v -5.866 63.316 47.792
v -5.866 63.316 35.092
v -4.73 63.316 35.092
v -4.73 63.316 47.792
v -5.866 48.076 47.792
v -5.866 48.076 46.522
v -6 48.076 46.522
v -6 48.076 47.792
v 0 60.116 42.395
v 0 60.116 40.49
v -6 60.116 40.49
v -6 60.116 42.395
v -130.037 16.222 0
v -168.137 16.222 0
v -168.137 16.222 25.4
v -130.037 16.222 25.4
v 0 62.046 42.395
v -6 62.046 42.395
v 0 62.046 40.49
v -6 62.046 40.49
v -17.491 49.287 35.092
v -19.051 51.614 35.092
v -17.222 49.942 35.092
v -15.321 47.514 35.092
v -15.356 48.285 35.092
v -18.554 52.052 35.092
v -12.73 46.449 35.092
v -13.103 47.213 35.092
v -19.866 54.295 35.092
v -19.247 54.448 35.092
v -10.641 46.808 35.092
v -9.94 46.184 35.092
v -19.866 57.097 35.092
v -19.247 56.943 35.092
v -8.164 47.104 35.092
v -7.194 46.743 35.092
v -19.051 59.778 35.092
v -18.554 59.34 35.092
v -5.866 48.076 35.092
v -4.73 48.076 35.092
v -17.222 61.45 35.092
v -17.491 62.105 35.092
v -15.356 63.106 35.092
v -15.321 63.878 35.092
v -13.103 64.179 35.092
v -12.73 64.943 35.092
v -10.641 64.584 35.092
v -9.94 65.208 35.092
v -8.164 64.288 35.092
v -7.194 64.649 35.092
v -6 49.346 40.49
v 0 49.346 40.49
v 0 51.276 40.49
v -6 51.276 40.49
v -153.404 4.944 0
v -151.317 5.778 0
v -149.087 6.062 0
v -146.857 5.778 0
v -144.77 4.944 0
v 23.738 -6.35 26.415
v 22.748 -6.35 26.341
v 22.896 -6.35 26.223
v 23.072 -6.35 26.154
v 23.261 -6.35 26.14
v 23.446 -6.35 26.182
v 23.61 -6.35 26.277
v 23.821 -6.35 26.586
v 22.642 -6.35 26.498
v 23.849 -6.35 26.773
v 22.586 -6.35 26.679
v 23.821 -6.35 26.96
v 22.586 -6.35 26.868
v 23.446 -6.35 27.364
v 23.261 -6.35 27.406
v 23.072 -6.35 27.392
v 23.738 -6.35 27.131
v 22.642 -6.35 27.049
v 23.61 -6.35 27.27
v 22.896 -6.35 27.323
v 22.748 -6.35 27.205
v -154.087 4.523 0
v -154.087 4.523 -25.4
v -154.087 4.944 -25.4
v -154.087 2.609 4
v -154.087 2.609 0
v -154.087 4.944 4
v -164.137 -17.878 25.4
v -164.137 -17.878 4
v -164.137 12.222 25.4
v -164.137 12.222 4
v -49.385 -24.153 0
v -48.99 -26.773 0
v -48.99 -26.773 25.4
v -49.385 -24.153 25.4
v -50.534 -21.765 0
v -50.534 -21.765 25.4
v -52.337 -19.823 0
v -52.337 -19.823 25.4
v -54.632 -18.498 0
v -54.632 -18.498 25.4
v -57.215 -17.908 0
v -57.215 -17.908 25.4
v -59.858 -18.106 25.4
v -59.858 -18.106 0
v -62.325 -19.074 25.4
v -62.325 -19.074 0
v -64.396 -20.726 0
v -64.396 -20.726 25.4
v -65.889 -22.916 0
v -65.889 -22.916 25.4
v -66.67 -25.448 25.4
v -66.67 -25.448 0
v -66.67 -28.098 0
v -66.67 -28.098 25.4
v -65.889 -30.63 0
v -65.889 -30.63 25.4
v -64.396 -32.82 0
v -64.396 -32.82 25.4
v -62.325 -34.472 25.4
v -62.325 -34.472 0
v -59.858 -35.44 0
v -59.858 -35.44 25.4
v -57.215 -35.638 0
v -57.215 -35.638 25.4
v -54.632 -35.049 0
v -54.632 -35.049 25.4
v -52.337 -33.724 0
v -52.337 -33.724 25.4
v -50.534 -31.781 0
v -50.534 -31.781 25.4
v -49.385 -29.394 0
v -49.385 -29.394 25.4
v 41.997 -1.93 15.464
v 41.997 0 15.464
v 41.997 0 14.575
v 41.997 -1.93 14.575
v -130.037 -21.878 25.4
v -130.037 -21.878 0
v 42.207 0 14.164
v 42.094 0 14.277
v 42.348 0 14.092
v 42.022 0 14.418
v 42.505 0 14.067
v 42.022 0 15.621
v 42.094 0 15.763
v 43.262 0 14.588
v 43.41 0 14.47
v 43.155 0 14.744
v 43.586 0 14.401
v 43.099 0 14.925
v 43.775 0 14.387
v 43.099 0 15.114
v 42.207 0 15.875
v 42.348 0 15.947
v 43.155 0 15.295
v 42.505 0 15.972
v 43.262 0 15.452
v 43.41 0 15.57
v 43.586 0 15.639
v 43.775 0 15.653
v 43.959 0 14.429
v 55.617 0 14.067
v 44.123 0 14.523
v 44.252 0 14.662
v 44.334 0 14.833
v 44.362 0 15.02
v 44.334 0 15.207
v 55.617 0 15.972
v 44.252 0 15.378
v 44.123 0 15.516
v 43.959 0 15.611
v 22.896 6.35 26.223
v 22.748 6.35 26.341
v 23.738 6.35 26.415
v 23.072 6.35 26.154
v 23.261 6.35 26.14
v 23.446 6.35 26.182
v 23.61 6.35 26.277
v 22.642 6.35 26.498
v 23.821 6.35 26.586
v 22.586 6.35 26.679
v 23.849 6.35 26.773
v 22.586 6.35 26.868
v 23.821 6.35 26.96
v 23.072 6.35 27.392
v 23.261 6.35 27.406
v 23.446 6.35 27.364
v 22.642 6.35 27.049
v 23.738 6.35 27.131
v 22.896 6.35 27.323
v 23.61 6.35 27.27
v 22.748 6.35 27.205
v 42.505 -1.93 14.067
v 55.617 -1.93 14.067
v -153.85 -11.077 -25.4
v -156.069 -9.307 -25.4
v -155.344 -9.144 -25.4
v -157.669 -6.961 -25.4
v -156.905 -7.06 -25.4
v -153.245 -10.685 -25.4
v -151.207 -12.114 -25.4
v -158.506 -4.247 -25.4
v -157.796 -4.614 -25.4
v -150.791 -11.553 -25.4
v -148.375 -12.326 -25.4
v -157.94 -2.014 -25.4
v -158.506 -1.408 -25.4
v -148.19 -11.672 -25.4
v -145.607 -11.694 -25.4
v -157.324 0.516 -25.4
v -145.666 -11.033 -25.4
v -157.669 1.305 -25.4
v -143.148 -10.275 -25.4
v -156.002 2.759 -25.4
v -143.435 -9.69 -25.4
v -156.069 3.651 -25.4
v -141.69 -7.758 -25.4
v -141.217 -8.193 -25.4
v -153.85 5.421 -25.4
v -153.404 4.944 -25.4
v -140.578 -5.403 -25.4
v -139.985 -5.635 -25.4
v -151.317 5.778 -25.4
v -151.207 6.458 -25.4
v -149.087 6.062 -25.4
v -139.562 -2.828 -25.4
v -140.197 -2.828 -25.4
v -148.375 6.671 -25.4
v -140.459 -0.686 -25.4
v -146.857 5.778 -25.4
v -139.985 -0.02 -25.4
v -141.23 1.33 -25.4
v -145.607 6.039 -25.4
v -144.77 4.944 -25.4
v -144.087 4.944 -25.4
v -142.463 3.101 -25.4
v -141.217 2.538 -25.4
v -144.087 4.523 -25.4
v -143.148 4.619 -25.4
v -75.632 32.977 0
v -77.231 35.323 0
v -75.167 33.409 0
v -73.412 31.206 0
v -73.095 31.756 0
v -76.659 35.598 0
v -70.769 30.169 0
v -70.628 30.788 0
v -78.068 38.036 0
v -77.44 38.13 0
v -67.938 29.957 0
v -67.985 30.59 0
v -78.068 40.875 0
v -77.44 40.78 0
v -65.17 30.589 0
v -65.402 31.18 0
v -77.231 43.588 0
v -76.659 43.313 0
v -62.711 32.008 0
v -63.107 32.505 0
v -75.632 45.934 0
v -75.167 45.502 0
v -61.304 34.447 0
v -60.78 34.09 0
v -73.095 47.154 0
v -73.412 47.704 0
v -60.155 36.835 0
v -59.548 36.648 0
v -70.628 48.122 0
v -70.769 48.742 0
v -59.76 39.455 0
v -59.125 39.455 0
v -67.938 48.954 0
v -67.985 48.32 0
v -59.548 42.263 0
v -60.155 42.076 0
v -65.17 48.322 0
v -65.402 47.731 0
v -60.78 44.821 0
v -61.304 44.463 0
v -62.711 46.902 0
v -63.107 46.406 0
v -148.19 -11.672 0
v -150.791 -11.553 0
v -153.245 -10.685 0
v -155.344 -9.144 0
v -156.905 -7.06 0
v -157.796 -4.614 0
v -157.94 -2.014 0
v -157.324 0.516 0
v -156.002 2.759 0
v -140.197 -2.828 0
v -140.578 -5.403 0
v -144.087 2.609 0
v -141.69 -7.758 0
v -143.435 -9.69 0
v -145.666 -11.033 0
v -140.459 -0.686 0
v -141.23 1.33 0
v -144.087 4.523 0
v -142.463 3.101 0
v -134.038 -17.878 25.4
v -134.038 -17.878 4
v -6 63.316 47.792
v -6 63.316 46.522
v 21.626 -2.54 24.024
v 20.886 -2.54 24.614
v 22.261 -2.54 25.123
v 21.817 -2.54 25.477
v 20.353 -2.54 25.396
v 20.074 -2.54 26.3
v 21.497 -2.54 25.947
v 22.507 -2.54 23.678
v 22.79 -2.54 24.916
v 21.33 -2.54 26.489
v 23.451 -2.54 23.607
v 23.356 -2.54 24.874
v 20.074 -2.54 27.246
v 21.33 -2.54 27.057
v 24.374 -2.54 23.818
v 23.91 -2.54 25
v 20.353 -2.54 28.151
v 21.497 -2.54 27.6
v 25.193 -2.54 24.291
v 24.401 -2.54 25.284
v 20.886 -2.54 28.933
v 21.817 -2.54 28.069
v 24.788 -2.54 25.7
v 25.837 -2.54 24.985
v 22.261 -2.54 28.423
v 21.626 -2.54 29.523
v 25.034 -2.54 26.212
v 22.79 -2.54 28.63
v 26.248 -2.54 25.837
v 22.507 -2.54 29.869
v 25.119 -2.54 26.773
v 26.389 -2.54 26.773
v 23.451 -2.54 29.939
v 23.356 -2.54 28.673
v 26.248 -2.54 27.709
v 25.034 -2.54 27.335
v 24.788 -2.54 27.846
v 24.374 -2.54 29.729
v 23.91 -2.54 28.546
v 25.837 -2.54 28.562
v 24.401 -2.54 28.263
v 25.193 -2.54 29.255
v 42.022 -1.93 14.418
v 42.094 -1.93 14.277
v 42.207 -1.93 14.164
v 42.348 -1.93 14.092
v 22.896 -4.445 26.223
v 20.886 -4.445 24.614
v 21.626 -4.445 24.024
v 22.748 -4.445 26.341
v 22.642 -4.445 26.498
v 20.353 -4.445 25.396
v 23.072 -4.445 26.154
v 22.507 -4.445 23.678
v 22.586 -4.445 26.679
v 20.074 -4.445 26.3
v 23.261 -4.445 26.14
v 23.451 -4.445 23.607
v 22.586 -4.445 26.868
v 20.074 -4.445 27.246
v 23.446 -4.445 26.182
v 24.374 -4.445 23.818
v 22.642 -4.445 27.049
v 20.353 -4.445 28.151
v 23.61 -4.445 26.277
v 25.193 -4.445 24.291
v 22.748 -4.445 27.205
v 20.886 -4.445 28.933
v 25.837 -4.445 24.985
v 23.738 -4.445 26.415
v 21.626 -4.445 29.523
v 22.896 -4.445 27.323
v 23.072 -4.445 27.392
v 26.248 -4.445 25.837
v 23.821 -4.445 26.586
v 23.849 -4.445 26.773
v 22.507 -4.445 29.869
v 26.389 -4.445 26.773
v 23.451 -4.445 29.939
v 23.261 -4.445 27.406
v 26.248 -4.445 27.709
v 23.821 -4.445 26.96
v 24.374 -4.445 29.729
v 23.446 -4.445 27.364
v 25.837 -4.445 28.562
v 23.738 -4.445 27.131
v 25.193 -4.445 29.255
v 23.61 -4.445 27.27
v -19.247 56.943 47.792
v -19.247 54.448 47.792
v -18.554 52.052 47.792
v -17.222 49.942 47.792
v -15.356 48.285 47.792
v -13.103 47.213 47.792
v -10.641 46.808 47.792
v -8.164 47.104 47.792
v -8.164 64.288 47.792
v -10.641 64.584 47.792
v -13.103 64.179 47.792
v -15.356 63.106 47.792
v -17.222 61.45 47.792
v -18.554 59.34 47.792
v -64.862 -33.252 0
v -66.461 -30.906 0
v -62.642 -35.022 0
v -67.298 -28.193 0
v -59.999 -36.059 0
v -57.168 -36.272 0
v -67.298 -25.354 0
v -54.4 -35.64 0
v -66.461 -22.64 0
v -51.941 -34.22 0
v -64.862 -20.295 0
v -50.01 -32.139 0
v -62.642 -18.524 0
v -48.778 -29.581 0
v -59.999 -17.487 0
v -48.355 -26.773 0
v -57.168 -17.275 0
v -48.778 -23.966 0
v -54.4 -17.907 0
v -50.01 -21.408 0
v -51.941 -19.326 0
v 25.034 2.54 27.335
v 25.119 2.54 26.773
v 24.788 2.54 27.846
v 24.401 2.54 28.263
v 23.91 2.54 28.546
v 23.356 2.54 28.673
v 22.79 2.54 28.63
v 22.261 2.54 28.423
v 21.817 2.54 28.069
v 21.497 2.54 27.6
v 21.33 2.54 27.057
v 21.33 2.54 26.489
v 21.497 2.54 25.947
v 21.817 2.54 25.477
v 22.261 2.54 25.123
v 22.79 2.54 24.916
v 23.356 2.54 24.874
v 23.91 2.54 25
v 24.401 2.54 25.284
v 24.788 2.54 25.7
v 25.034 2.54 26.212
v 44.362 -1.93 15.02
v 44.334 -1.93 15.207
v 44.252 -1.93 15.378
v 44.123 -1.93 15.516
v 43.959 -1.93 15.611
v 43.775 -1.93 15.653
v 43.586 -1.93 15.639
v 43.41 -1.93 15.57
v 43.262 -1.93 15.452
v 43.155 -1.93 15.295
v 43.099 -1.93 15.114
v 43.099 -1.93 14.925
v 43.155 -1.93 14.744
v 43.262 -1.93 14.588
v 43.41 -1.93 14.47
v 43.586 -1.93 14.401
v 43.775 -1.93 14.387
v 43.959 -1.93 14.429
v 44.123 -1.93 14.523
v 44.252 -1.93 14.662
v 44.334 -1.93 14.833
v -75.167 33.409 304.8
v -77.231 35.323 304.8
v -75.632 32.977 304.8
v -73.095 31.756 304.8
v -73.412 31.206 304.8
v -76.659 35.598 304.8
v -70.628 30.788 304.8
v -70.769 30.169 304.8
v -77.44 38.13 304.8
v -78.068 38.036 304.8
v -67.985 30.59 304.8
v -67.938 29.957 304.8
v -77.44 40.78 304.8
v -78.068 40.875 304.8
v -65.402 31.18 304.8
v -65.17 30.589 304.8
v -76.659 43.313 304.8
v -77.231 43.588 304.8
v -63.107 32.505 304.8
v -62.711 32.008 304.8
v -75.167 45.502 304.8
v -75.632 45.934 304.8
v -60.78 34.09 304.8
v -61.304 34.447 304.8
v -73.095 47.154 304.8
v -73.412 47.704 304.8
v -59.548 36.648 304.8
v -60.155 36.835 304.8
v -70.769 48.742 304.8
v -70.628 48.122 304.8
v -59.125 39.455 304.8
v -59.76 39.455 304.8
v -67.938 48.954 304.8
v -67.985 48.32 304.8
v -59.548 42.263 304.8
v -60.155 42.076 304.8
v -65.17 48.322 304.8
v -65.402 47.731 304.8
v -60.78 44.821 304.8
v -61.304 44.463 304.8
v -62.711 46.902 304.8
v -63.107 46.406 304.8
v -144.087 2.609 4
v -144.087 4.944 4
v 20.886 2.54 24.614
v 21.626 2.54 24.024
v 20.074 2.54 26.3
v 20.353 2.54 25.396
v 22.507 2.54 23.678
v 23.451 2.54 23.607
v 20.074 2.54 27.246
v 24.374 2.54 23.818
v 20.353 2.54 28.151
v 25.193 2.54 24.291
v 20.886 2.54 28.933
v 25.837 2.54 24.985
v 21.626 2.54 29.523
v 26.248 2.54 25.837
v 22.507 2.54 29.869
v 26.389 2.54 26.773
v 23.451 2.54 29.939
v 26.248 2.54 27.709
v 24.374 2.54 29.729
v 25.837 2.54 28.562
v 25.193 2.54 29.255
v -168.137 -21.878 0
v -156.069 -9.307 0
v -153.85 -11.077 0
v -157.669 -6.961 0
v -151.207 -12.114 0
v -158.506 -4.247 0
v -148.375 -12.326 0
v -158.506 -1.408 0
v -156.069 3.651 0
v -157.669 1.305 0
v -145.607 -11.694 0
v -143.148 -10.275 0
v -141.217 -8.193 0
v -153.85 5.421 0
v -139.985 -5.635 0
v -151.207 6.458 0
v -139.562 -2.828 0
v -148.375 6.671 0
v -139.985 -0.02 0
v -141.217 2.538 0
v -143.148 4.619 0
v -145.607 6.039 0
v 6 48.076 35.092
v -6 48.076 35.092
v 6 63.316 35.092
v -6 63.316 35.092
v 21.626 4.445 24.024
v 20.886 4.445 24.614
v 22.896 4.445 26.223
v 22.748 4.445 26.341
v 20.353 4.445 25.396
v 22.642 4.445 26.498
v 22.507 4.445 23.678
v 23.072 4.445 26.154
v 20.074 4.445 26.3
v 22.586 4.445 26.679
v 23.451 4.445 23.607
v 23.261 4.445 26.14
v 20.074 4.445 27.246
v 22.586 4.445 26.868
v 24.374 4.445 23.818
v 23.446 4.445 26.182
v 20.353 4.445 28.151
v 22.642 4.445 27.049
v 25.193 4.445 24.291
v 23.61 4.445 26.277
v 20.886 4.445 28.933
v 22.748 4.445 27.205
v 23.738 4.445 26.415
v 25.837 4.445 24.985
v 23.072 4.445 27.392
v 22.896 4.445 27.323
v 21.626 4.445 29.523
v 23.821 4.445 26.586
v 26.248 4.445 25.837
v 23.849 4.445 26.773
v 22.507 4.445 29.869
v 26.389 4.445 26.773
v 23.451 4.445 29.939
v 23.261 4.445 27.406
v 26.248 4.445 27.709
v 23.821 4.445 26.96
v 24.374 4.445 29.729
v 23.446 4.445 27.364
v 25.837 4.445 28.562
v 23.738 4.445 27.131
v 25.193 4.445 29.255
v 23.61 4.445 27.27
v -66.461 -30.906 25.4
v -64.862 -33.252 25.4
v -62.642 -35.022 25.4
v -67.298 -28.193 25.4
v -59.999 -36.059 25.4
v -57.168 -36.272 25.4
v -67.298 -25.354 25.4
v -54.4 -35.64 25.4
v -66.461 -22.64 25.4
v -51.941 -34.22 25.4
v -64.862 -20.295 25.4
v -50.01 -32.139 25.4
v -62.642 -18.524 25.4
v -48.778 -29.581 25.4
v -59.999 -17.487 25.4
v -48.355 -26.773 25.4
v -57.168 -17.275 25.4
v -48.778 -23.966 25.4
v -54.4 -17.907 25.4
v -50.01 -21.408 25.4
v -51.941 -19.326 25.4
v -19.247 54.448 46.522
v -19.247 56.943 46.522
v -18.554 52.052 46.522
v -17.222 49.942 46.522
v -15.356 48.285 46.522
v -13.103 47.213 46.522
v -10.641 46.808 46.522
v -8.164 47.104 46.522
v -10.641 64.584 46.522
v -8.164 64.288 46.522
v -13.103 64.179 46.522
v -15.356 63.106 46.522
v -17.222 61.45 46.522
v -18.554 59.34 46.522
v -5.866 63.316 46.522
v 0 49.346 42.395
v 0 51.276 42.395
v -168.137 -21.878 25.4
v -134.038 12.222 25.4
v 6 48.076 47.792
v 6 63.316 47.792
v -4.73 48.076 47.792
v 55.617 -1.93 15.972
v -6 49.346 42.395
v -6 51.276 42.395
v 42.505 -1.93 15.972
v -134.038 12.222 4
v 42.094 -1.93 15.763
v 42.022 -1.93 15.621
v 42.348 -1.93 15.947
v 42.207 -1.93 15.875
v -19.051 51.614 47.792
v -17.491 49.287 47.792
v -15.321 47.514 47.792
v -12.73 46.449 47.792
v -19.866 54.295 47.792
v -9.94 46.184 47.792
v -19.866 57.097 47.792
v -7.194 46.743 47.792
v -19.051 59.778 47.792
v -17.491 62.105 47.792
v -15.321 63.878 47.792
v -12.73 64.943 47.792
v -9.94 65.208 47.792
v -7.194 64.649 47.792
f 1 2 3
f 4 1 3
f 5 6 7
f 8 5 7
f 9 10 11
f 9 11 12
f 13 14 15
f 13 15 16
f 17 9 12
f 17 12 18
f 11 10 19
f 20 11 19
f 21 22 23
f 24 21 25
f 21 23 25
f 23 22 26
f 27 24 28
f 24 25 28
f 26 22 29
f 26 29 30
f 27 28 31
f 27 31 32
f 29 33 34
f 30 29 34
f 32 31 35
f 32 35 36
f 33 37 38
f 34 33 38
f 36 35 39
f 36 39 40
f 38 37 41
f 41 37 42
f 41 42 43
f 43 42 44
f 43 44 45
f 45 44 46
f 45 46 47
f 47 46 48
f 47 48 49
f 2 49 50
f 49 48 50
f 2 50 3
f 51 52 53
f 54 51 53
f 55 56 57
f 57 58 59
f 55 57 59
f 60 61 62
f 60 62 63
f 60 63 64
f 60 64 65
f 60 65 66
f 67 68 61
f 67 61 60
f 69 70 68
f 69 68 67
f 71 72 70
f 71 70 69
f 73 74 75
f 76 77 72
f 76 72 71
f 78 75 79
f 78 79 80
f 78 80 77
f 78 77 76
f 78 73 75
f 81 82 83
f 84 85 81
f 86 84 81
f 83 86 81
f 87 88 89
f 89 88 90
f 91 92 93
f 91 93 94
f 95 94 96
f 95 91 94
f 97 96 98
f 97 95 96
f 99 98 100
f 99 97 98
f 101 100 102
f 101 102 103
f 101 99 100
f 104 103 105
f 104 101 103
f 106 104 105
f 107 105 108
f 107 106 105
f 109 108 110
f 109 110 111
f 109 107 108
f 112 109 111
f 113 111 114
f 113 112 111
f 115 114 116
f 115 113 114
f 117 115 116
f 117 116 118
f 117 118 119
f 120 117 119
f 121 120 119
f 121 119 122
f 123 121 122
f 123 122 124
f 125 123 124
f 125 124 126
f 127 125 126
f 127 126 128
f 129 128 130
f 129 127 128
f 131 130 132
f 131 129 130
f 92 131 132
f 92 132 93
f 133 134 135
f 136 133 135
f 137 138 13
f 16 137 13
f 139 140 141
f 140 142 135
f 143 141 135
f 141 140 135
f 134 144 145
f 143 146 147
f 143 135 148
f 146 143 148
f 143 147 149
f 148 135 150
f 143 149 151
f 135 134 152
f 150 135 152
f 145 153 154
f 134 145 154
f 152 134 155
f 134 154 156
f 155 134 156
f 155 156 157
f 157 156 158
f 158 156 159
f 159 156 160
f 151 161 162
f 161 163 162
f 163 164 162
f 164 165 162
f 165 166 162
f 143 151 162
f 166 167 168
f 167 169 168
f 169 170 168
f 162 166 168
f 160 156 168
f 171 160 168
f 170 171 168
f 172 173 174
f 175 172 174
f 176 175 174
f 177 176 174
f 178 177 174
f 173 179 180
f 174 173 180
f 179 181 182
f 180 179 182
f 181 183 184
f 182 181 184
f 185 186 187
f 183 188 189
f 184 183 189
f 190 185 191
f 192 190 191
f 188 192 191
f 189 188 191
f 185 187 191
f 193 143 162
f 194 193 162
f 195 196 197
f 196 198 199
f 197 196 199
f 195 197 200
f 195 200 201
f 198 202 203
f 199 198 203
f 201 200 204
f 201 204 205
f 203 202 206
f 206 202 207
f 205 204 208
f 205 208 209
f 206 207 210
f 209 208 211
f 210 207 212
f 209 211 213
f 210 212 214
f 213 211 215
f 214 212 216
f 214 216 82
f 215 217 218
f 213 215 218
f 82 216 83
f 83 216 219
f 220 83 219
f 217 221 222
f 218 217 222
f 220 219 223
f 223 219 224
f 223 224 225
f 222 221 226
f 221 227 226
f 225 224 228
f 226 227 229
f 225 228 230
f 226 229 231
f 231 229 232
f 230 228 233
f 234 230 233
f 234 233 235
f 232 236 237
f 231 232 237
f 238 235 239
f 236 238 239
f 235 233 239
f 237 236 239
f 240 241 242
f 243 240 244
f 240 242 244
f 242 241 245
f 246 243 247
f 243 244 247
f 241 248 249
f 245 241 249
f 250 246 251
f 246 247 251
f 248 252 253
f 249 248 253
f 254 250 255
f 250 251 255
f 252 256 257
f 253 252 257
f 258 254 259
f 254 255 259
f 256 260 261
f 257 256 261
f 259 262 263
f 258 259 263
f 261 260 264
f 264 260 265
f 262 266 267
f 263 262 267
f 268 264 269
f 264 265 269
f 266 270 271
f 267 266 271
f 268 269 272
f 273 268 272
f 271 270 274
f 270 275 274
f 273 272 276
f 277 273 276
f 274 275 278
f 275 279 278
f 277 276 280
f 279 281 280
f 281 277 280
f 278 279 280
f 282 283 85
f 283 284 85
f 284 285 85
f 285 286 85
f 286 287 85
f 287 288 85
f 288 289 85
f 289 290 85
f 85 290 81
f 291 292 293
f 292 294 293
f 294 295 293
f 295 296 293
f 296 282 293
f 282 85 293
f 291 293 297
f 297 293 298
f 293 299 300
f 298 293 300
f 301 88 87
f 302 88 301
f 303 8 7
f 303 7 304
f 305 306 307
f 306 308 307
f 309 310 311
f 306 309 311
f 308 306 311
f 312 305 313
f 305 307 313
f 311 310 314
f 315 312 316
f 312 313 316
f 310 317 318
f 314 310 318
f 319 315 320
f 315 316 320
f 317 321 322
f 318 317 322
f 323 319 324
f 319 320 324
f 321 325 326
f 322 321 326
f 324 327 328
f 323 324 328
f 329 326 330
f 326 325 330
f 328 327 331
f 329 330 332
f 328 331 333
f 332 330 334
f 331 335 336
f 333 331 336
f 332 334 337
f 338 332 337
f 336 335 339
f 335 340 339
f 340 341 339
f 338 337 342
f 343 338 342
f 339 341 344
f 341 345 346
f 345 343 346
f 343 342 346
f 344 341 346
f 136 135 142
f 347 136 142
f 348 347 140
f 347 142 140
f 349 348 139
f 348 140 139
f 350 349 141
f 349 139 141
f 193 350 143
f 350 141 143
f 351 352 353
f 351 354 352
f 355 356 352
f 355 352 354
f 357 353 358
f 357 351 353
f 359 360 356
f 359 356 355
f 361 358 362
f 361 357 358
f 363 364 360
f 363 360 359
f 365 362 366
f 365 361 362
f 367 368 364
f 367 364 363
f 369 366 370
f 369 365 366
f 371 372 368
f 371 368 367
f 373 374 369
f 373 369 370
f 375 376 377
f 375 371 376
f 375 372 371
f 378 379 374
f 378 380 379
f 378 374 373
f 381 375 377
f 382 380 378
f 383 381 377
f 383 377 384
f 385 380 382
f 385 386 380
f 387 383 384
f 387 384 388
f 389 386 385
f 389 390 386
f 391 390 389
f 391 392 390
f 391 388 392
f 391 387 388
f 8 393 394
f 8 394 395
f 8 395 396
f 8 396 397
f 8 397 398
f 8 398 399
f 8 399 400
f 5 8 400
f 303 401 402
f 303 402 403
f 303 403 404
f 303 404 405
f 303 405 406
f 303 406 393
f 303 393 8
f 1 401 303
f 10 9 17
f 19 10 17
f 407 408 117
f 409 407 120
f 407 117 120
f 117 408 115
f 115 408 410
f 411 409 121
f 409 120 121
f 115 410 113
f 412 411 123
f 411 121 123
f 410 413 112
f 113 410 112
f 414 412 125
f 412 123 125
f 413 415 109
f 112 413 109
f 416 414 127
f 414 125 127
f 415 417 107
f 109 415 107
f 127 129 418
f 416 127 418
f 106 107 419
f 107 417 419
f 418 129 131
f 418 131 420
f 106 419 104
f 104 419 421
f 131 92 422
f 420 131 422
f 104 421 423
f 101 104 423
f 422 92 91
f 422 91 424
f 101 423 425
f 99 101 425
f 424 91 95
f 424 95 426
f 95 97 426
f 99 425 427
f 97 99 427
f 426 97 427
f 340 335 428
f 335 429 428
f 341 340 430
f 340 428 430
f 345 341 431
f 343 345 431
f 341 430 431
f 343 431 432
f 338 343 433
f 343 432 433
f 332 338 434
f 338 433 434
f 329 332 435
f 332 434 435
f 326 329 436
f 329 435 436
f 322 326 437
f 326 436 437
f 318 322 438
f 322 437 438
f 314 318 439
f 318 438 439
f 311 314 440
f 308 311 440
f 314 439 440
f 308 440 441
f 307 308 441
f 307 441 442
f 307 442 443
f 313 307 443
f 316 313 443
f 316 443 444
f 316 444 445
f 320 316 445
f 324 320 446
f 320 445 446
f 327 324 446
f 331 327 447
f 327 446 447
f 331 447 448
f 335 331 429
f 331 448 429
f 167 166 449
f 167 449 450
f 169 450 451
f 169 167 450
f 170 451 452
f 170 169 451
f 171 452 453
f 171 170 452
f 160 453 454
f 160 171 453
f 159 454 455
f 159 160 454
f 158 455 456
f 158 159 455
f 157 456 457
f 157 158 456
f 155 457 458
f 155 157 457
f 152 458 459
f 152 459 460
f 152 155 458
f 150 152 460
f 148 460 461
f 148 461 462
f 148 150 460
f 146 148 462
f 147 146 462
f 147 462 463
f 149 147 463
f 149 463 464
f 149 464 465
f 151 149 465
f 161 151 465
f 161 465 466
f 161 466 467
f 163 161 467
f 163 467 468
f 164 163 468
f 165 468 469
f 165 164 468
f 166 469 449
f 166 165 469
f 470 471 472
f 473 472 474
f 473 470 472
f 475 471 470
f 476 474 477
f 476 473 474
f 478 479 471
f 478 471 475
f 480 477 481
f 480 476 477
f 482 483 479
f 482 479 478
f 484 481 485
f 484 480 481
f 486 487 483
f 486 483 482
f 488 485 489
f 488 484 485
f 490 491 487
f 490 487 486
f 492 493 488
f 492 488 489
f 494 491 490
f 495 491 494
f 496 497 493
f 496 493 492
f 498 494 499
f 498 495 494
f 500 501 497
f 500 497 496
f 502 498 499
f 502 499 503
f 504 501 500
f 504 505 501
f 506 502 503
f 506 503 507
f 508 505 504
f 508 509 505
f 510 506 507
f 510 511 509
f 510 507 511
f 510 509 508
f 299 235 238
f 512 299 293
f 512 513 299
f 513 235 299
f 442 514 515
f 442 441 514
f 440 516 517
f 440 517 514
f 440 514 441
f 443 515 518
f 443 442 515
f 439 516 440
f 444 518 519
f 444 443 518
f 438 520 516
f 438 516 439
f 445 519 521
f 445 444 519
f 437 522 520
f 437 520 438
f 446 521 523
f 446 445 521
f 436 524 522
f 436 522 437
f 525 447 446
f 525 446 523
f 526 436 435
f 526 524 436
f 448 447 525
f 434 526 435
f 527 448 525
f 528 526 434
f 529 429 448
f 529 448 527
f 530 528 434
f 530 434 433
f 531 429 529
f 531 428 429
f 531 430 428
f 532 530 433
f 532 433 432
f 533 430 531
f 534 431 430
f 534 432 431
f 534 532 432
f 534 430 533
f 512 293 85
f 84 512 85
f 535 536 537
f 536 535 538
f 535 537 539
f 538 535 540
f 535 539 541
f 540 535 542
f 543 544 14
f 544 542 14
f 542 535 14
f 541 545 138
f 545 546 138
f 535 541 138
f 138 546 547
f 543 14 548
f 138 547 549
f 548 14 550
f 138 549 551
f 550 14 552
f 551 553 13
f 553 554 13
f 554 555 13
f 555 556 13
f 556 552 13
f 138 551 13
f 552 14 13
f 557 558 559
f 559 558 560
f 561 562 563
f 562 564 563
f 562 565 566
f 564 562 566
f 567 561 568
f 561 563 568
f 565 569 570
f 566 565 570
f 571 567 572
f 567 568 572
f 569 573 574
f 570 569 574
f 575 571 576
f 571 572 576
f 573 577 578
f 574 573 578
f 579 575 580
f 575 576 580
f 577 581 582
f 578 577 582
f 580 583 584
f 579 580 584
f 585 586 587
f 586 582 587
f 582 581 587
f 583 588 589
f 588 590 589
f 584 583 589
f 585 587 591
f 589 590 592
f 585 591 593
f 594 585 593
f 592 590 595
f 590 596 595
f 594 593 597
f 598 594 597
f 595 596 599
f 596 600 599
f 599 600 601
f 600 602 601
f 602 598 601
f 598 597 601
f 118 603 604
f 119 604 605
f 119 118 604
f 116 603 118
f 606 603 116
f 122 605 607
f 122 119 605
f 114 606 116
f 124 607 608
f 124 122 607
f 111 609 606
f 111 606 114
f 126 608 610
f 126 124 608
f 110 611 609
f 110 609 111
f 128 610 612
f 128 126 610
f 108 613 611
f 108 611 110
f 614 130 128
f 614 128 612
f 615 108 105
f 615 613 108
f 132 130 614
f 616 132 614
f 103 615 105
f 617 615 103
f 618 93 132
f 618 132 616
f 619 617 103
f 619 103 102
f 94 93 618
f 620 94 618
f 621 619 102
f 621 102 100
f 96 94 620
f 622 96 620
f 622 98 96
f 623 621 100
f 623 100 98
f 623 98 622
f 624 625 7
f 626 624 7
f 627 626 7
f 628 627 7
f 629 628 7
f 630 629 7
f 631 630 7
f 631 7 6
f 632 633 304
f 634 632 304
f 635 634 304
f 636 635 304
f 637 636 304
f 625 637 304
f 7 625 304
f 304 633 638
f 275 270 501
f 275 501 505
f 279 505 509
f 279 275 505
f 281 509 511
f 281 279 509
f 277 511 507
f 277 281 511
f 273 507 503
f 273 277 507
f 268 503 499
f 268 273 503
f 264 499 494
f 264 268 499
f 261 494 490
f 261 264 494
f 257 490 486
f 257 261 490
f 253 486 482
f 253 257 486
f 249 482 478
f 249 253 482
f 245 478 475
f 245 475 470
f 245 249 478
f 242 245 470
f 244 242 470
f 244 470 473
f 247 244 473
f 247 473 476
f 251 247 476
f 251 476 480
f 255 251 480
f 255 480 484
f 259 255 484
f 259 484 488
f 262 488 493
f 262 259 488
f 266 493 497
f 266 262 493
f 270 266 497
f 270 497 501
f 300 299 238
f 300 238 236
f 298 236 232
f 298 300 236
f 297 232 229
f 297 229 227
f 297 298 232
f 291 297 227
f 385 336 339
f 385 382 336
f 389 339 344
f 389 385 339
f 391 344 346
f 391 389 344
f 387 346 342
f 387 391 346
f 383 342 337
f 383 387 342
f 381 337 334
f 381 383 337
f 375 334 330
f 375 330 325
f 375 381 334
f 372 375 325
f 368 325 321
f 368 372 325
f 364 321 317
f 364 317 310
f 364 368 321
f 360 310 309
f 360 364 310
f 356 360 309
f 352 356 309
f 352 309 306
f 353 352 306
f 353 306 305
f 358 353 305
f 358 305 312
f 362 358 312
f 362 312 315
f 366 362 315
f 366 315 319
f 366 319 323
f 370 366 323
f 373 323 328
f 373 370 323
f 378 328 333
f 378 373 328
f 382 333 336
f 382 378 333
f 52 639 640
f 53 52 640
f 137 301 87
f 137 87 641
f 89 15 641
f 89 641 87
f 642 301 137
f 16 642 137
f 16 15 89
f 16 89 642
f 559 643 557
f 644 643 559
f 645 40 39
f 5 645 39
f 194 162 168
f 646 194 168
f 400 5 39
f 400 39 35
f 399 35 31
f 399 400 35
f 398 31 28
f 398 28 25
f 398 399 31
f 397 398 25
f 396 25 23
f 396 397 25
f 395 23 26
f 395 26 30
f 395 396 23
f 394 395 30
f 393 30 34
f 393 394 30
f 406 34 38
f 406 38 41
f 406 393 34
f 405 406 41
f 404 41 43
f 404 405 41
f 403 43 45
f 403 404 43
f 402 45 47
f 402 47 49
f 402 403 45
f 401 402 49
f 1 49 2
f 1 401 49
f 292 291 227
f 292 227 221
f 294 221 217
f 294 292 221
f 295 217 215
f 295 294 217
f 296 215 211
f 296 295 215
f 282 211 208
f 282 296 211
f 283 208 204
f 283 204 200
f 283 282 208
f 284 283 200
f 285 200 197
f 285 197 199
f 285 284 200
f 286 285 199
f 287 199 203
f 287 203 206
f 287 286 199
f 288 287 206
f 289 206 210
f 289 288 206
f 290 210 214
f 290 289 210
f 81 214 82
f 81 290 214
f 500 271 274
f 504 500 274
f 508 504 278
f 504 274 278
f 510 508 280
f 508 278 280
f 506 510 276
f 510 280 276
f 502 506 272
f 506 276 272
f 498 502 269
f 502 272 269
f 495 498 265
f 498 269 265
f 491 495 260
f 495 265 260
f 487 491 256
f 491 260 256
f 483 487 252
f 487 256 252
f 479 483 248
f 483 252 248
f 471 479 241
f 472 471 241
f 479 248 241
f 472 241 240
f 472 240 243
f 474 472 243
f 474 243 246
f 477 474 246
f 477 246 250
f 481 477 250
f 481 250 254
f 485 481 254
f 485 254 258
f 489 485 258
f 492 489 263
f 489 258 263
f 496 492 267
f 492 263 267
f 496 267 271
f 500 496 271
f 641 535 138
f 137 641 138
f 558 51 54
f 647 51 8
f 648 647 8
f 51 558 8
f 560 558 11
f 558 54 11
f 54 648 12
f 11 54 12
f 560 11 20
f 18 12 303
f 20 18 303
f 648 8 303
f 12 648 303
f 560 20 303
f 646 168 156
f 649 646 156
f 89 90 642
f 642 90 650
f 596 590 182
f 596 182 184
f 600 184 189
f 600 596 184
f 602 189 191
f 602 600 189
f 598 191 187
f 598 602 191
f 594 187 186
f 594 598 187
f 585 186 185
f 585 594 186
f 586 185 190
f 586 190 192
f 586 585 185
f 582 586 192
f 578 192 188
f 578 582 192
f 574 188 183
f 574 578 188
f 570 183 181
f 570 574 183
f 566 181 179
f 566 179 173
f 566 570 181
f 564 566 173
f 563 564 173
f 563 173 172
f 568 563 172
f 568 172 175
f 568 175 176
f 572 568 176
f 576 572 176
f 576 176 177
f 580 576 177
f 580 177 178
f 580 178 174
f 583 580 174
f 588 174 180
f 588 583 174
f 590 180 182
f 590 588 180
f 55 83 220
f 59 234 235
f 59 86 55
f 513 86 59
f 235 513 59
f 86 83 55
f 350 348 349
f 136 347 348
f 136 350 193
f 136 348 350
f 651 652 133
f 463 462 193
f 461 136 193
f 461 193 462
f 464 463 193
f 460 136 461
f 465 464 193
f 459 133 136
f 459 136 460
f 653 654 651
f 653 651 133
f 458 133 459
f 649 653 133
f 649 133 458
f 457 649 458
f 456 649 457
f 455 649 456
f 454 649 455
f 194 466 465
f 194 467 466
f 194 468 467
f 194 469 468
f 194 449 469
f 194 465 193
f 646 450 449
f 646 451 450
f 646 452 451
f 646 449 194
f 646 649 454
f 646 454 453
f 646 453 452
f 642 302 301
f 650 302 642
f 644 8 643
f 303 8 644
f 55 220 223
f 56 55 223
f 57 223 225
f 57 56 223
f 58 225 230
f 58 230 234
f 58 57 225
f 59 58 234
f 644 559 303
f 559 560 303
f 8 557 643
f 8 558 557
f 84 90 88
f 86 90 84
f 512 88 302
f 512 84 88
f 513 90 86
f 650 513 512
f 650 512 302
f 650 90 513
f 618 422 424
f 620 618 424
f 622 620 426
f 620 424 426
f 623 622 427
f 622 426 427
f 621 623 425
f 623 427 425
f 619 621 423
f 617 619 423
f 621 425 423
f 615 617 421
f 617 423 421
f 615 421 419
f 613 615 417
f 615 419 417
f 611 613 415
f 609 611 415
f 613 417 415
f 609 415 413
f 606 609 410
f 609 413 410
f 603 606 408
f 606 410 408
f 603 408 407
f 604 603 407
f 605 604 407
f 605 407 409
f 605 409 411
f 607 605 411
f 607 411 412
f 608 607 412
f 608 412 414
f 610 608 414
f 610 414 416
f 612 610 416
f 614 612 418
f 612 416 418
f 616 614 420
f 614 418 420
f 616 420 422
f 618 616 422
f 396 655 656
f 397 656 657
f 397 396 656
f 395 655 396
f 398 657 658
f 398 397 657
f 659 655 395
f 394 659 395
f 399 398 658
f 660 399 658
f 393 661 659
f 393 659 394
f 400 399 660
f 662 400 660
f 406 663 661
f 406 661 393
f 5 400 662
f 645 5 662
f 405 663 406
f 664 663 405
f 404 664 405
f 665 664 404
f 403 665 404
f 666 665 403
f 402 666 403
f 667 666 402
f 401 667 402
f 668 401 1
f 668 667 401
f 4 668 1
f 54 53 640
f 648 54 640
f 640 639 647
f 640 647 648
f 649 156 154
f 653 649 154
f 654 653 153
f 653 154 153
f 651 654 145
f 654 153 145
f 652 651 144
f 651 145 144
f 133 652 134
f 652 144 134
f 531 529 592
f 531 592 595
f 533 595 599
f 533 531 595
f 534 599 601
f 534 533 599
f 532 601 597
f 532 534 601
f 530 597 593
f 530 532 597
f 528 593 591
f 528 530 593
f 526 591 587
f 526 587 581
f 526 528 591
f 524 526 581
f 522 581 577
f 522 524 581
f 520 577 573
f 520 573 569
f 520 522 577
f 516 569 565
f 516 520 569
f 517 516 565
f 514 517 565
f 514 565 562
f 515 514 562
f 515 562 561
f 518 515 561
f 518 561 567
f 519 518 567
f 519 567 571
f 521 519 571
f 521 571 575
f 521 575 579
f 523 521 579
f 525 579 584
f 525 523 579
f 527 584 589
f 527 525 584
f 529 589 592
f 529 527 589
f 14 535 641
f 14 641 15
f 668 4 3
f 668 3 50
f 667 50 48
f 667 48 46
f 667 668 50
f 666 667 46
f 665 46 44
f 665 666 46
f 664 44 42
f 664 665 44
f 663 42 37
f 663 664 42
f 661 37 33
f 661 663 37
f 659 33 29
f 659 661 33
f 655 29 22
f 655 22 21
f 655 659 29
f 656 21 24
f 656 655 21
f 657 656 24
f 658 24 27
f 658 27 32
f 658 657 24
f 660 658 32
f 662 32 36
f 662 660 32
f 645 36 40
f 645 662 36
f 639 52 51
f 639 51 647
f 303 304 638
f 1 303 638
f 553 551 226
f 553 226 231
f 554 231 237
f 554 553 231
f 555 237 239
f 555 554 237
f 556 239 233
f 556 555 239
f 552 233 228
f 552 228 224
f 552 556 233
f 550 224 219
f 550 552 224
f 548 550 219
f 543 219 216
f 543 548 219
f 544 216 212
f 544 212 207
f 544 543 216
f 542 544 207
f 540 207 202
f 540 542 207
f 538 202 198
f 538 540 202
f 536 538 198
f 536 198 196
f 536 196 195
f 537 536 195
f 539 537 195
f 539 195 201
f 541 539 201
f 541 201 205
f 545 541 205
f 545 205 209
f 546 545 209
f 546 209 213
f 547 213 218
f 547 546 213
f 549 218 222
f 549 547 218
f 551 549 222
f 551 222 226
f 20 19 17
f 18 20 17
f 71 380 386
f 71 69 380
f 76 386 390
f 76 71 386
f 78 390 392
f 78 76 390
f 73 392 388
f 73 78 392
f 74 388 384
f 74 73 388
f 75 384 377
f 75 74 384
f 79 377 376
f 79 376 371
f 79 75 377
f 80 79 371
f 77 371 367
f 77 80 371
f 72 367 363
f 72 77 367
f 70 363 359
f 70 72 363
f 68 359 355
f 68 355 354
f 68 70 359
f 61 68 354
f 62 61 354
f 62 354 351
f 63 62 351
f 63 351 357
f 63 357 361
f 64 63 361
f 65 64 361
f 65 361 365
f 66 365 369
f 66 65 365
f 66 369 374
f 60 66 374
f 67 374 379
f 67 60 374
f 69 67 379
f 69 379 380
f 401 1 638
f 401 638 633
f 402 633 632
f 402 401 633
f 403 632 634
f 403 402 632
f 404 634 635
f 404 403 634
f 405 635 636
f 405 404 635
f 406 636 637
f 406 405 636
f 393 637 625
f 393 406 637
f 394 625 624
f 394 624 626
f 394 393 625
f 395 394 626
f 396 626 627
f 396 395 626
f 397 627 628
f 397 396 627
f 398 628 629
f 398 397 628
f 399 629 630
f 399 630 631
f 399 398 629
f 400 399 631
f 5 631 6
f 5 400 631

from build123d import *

# Parameters (mm, degrees)
F0_R      = 9.525
F0_R_2    = 8.89
F1_DEPTH  = 25.4
F2_R      = 0.635
F3_DEPTH  = 6.35
F2_R_2    = 3.175
F2_R_3    = 1.905
F4_DEPTH  = 4.445
F5_DEPTH  = 2.54
F6_R      = 0.635
F7_DEPTH  = 1.9304
F8_W      = 15.24
F8_H      = 12.7
F8_W_2    = 1.9304
F8_H_2    = 1.905
F9_DEPTH  = 6
F10_DEPTH = 6
F12_DEPTH = 12.7
F13_DEPTH = 1.27
F14_W     = 38.1
F14_H     = 38.1
F14_W_2   = 30.099
F14_H_2   = 30.1
F15_DEPTH = 25.4
F14_R     = 9.525
F16_DEPTH = 4
F17_DEPTH = 25.4
F18_R     = 9.525
F18_R_2   = 8.89
F19_DEPTH = 304.8


with BuildPart() as f1:
    # F0 (on Top) → F1 (new body)
    with BuildSketch(Plane.XY):
        with Locations((-57.8795745969, -26.773173362)):
            Circle(F0_R)
        with Locations((-57.8795745969, -26.773173362)):
            Circle(F0_R_2, mode=Mode.SUBTRACT)
    extrude(amount=F1_DEPTH)


with BuildPart() as f3:
    # F2 (on Front) → F3 (new body, symmetric)
    with BuildSketch(Plane.XZ):
        with Locations((23.2137329876, 26.773173362)):
            Circle(F2_R)
    extrude(amount=F3_DEPTH, both=True)

    # F2 (on Front) → F4 (join, symmetric)
    with BuildSketch(Plane.XZ):
        with Locations((23.2137329876, 26.773173362)):
            Circle(F2_R_2)
        with Locations((23.2137329876, 26.773173362)):
            Circle(F2_R_3, mode=Mode.SUBTRACT)
        with Locations((23.2137329876, 26.773173362)):
            Circle(F2_R_3)
        with Locations((23.2137329876, 26.773173362)):
            Circle(F2_R, mode=Mode.SUBTRACT)
    extrude(amount=F4_DEPTH, both=True)

    # F2 (on Front) → F5 (cut, symmetric)
    with BuildSketch(Plane.XZ):
        with Locations((23.2137329876, 26.773173362)):
            Circle(F2_R_2)
        with Locations((23.2137329876, 26.773173362)):
            Circle(F2_R_3, mode=Mode.SUBTRACT)
    extrude(amount=F5_DEPTH, both=True, mode=Mode.SUBTRACT)


with BuildPart() as f7:
    # F6 (on Front) → F7 (new body)
    with BuildSketch(Plane.XZ):
        with BuildLine():
            ThreePointArc((41.9973280752, 14.5753064631), (42.1461178303, 14.2160962183), (42.5053280752, 14.0673064631))
            Line((42.5053280752, 14.0673064631), (55.6173280752, 14.0673064631))
            Line((55.6173280752, 14.0673064631), (55.6173280752, 15.9723064631))
            Line((55.6173280752, 15.9723064631), (42.5053280752, 15.9723064631))
            ThreePointArc((42.5053280752, 15.9723064631), (42.1461178303, 15.8235167079), (41.9973280752, 15.4643064631))
            Line((41.9973280752, 15.4643064631), (41.9973280752, 14.5753064631))
        make_face()
        with Locations((43.7273280752, 15.0198064631)):
            Circle(F6_R, mode=Mode.SUBTRACT)
    extrude(amount=F7_DEPTH)


with BuildPart() as f9:
    # F8 (on Right) → F9 (new body)
    with BuildSketch(Plane.YZ):
        with Locations((55.6959787431, 41.4424056315)):
            Rectangle(F8_W, F8_H)
        with Locations((50.3111787431, 41.4424056315)):
            Rectangle(F8_W_2, F8_H_2, mode=Mode.SUBTRACT)
        with Locations((61.0807787431, 41.4424056315)):
            Rectangle(F8_W_2, F8_H_2, mode=Mode.SUBTRACT)
    extrude(amount=-F9_DEPTH)

    # F8 (on Right) → F10 (join)
    with BuildSketch(Plane.YZ):
        with Locations((55.6959787431, 41.4424056315)):
            Rectangle(F8_W, F8_H)
        with Locations((50.3111787431, 41.4424056315)):
            Rectangle(F8_W_2, F8_H_2, mode=Mode.SUBTRACT)
        with Locations((61.0807787431, 41.4424056315)):
            Rectangle(F8_W_2, F8_H_2, mode=Mode.SUBTRACT)
        with Locations((50.3111787431, 41.4424056315)):
            Rectangle(F8_W_2, F8_H_2)
        with Locations((61.0807787431, 41.4424056315)):
            Rectangle(F8_W_2, F8_H_2)
    extrude(amount=F10_DEPTH)


with BuildPart() as f12:
    # F11 (on face) → F12 (new body)
    with BuildSketch(Plane.XY.offset(47.7924056315)):
        with BuildLine():
            Line((-5.8659498802, 63.3159787431), (-4.73, 63.3159787431))
            ThreePointArc((-4.73, 63.3159787431), (-19.97, 55.6959787431), (-4.73, 48.0759787431))
            Line((-4.73, 48.0759787431), (-5.8659498802, 48.0759787431))
            ThreePointArc((-5.8659498802, 48.0759787431), (-19.335, 55.6959787431), (-5.8659498802, 63.3159787431))
        make_face()
    extrude(amount=-F12_DEPTH)


with BuildPart() as f13:
    # F11 (on face) → F13 (new body)
    with BuildSketch(Plane.XY.offset(47.7924056315)):
        with BuildLine():
            Line((-6, 63.3159787431), (-5.8659498802, 63.3159787431))
            ThreePointArc((-5.8659498802, 63.3159787431), (-19.335, 55.6959787431), (-5.8659498802, 48.0759787431))
            Line((-5.8659498802, 48.0759787431), (-6, 48.0759787431))
            Line((-6, 48.0759787431), (-6, 63.3159787431))
        make_face()
    extrude(amount=-F13_DEPTH)


with BuildPart() as f15:
    # F14 (on Top) → F15 (new body)
    with BuildSketch(Plane.XY):
        with Locations((-149.0871561402, -2.8278583124)):
            Rectangle(F14_W, F14_H)
        with Locations((-149.0871561402, -2.8278583124)):
            Rectangle(F14_W_2, F14_H_2, mode=Mode.SUBTRACT)
    extrude(amount=F15_DEPTH)

    # F14 (on Top) → F16 (join)
    with BuildSketch(Plane.XY):
        with Locations((-149.0871561402, -2.8278583124)):
            Rectangle(F14_W_2, F14_H_2)
        with Locations((-149.0871561402, -2.8278583124)):
            Circle(F14_R, mode=Mode.SUBTRACT)
        with Locations((-149.0871561402, -2.8278583124)):
            Circle(F14_R)
        with BuildLine():
            ThreePointArc((-144.0871561402, 4.5227947198), (-141.2296088129, 1.3303925217), (-140.1971561402, -2.8278583124))
            ThreePointArc((-140.1971561402, -2.8278583124), (-153.2454069744, -10.6854056397), (-154.0871561402, 4.5227947198))
            Line((-154.0871561402, 4.5227947198), (-154.0871561402, 4.9436746754))
            Line((-154.0871561402, 4.9436746754), (-153.4040271156, 4.9436746754))
            ThreePointArc((-153.4040271156, 4.9436746754), (-149.0871561402, 6.0621416876), (-144.7702851648, 4.9436746754))
            Line((-144.7702851648, 4.9436746754), (-144.0871561402, 4.9436746754))
            Line((-144.0871561402, 4.9436746754), (-144.0871561402, 4.5227947198))
        make_face(mode=Mode.SUBTRACT)
        with BuildLine():
            ThreePointArc((-154.0871561402, 4.5227947198), (-153.2454069744, -10.6854056397), (-140.1971561402, -2.8278583124))
            ThreePointArc((-140.1971561402, -2.8278583124), (-141.2296088129, 1.3303925217), (-144.0871561402, 4.5227947198))
            Line((-144.0871561402, 4.5227947198), (-144.0871561402, 2.6086086997))
            Line((-144.0871561402, 2.6086086997), (-154.0871561402, 2.6086086997))
            Line((-154.0871561402, 2.6086086997), (-154.0871561402, 4.5227947198))
        make_face()
        with BuildLine():
            Line((-153.4040271156, 4.9436746754), (-144.7702851648, 4.9436746754))
            ThreePointArc((-144.7702851648, 4.9436746754), (-149.0871561402, 6.0621416876), (-153.4040271156, 4.9436746754))
        make_face()
    extrude(amount=F16_DEPTH)

    # F14 (on Top) → F17 (join)
    with BuildSketch(Plane.XY):
        with Locations((-149.0871561402, -2.8278583124)):
            Circle(F14_R)
        with BuildLine():
            ThreePointArc((-144.0871561402, 4.5227947198), (-141.2296088129, 1.3303925217), (-140.1971561402, -2.8278583124))
            ThreePointArc((-140.1971561402, -2.8278583124), (-153.2454069744, -10.6854056397), (-154.0871561402, 4.5227947198))
            Line((-154.0871561402, 4.5227947198), (-154.0871561402, 4.9436746754))
            Line((-154.0871561402, 4.9436746754), (-153.4040271156, 4.9436746754))
            ThreePointArc((-153.4040271156, 4.9436746754), (-149.0871561402, 6.0621416876), (-144.7702851648, 4.9436746754))
            Line((-144.7702851648, 4.9436746754), (-144.0871561402, 4.9436746754))
            Line((-144.0871561402, 4.9436746754), (-144.0871561402, 4.5227947198))
        make_face(mode=Mode.SUBTRACT)
    extrude(amount=-F17_DEPTH)


with BuildPart() as f19:
    # F18 (on Top) → F19 (new body)
    with BuildSketch(Plane.XY):
        with Locations((-68.6496794224, 39.455337053)):
            Circle(F18_R)
        with Locations((-68.6496794224, 39.455337053)):
            Circle(F18_R_2, mode=Mode.SUBTRACT)
    extrude(amount=F19_DEPTH)


solid = Compound([f1.part, f3.part, f7.part, f9.part, f12.part, f13.part, f15.part, f19.part])
